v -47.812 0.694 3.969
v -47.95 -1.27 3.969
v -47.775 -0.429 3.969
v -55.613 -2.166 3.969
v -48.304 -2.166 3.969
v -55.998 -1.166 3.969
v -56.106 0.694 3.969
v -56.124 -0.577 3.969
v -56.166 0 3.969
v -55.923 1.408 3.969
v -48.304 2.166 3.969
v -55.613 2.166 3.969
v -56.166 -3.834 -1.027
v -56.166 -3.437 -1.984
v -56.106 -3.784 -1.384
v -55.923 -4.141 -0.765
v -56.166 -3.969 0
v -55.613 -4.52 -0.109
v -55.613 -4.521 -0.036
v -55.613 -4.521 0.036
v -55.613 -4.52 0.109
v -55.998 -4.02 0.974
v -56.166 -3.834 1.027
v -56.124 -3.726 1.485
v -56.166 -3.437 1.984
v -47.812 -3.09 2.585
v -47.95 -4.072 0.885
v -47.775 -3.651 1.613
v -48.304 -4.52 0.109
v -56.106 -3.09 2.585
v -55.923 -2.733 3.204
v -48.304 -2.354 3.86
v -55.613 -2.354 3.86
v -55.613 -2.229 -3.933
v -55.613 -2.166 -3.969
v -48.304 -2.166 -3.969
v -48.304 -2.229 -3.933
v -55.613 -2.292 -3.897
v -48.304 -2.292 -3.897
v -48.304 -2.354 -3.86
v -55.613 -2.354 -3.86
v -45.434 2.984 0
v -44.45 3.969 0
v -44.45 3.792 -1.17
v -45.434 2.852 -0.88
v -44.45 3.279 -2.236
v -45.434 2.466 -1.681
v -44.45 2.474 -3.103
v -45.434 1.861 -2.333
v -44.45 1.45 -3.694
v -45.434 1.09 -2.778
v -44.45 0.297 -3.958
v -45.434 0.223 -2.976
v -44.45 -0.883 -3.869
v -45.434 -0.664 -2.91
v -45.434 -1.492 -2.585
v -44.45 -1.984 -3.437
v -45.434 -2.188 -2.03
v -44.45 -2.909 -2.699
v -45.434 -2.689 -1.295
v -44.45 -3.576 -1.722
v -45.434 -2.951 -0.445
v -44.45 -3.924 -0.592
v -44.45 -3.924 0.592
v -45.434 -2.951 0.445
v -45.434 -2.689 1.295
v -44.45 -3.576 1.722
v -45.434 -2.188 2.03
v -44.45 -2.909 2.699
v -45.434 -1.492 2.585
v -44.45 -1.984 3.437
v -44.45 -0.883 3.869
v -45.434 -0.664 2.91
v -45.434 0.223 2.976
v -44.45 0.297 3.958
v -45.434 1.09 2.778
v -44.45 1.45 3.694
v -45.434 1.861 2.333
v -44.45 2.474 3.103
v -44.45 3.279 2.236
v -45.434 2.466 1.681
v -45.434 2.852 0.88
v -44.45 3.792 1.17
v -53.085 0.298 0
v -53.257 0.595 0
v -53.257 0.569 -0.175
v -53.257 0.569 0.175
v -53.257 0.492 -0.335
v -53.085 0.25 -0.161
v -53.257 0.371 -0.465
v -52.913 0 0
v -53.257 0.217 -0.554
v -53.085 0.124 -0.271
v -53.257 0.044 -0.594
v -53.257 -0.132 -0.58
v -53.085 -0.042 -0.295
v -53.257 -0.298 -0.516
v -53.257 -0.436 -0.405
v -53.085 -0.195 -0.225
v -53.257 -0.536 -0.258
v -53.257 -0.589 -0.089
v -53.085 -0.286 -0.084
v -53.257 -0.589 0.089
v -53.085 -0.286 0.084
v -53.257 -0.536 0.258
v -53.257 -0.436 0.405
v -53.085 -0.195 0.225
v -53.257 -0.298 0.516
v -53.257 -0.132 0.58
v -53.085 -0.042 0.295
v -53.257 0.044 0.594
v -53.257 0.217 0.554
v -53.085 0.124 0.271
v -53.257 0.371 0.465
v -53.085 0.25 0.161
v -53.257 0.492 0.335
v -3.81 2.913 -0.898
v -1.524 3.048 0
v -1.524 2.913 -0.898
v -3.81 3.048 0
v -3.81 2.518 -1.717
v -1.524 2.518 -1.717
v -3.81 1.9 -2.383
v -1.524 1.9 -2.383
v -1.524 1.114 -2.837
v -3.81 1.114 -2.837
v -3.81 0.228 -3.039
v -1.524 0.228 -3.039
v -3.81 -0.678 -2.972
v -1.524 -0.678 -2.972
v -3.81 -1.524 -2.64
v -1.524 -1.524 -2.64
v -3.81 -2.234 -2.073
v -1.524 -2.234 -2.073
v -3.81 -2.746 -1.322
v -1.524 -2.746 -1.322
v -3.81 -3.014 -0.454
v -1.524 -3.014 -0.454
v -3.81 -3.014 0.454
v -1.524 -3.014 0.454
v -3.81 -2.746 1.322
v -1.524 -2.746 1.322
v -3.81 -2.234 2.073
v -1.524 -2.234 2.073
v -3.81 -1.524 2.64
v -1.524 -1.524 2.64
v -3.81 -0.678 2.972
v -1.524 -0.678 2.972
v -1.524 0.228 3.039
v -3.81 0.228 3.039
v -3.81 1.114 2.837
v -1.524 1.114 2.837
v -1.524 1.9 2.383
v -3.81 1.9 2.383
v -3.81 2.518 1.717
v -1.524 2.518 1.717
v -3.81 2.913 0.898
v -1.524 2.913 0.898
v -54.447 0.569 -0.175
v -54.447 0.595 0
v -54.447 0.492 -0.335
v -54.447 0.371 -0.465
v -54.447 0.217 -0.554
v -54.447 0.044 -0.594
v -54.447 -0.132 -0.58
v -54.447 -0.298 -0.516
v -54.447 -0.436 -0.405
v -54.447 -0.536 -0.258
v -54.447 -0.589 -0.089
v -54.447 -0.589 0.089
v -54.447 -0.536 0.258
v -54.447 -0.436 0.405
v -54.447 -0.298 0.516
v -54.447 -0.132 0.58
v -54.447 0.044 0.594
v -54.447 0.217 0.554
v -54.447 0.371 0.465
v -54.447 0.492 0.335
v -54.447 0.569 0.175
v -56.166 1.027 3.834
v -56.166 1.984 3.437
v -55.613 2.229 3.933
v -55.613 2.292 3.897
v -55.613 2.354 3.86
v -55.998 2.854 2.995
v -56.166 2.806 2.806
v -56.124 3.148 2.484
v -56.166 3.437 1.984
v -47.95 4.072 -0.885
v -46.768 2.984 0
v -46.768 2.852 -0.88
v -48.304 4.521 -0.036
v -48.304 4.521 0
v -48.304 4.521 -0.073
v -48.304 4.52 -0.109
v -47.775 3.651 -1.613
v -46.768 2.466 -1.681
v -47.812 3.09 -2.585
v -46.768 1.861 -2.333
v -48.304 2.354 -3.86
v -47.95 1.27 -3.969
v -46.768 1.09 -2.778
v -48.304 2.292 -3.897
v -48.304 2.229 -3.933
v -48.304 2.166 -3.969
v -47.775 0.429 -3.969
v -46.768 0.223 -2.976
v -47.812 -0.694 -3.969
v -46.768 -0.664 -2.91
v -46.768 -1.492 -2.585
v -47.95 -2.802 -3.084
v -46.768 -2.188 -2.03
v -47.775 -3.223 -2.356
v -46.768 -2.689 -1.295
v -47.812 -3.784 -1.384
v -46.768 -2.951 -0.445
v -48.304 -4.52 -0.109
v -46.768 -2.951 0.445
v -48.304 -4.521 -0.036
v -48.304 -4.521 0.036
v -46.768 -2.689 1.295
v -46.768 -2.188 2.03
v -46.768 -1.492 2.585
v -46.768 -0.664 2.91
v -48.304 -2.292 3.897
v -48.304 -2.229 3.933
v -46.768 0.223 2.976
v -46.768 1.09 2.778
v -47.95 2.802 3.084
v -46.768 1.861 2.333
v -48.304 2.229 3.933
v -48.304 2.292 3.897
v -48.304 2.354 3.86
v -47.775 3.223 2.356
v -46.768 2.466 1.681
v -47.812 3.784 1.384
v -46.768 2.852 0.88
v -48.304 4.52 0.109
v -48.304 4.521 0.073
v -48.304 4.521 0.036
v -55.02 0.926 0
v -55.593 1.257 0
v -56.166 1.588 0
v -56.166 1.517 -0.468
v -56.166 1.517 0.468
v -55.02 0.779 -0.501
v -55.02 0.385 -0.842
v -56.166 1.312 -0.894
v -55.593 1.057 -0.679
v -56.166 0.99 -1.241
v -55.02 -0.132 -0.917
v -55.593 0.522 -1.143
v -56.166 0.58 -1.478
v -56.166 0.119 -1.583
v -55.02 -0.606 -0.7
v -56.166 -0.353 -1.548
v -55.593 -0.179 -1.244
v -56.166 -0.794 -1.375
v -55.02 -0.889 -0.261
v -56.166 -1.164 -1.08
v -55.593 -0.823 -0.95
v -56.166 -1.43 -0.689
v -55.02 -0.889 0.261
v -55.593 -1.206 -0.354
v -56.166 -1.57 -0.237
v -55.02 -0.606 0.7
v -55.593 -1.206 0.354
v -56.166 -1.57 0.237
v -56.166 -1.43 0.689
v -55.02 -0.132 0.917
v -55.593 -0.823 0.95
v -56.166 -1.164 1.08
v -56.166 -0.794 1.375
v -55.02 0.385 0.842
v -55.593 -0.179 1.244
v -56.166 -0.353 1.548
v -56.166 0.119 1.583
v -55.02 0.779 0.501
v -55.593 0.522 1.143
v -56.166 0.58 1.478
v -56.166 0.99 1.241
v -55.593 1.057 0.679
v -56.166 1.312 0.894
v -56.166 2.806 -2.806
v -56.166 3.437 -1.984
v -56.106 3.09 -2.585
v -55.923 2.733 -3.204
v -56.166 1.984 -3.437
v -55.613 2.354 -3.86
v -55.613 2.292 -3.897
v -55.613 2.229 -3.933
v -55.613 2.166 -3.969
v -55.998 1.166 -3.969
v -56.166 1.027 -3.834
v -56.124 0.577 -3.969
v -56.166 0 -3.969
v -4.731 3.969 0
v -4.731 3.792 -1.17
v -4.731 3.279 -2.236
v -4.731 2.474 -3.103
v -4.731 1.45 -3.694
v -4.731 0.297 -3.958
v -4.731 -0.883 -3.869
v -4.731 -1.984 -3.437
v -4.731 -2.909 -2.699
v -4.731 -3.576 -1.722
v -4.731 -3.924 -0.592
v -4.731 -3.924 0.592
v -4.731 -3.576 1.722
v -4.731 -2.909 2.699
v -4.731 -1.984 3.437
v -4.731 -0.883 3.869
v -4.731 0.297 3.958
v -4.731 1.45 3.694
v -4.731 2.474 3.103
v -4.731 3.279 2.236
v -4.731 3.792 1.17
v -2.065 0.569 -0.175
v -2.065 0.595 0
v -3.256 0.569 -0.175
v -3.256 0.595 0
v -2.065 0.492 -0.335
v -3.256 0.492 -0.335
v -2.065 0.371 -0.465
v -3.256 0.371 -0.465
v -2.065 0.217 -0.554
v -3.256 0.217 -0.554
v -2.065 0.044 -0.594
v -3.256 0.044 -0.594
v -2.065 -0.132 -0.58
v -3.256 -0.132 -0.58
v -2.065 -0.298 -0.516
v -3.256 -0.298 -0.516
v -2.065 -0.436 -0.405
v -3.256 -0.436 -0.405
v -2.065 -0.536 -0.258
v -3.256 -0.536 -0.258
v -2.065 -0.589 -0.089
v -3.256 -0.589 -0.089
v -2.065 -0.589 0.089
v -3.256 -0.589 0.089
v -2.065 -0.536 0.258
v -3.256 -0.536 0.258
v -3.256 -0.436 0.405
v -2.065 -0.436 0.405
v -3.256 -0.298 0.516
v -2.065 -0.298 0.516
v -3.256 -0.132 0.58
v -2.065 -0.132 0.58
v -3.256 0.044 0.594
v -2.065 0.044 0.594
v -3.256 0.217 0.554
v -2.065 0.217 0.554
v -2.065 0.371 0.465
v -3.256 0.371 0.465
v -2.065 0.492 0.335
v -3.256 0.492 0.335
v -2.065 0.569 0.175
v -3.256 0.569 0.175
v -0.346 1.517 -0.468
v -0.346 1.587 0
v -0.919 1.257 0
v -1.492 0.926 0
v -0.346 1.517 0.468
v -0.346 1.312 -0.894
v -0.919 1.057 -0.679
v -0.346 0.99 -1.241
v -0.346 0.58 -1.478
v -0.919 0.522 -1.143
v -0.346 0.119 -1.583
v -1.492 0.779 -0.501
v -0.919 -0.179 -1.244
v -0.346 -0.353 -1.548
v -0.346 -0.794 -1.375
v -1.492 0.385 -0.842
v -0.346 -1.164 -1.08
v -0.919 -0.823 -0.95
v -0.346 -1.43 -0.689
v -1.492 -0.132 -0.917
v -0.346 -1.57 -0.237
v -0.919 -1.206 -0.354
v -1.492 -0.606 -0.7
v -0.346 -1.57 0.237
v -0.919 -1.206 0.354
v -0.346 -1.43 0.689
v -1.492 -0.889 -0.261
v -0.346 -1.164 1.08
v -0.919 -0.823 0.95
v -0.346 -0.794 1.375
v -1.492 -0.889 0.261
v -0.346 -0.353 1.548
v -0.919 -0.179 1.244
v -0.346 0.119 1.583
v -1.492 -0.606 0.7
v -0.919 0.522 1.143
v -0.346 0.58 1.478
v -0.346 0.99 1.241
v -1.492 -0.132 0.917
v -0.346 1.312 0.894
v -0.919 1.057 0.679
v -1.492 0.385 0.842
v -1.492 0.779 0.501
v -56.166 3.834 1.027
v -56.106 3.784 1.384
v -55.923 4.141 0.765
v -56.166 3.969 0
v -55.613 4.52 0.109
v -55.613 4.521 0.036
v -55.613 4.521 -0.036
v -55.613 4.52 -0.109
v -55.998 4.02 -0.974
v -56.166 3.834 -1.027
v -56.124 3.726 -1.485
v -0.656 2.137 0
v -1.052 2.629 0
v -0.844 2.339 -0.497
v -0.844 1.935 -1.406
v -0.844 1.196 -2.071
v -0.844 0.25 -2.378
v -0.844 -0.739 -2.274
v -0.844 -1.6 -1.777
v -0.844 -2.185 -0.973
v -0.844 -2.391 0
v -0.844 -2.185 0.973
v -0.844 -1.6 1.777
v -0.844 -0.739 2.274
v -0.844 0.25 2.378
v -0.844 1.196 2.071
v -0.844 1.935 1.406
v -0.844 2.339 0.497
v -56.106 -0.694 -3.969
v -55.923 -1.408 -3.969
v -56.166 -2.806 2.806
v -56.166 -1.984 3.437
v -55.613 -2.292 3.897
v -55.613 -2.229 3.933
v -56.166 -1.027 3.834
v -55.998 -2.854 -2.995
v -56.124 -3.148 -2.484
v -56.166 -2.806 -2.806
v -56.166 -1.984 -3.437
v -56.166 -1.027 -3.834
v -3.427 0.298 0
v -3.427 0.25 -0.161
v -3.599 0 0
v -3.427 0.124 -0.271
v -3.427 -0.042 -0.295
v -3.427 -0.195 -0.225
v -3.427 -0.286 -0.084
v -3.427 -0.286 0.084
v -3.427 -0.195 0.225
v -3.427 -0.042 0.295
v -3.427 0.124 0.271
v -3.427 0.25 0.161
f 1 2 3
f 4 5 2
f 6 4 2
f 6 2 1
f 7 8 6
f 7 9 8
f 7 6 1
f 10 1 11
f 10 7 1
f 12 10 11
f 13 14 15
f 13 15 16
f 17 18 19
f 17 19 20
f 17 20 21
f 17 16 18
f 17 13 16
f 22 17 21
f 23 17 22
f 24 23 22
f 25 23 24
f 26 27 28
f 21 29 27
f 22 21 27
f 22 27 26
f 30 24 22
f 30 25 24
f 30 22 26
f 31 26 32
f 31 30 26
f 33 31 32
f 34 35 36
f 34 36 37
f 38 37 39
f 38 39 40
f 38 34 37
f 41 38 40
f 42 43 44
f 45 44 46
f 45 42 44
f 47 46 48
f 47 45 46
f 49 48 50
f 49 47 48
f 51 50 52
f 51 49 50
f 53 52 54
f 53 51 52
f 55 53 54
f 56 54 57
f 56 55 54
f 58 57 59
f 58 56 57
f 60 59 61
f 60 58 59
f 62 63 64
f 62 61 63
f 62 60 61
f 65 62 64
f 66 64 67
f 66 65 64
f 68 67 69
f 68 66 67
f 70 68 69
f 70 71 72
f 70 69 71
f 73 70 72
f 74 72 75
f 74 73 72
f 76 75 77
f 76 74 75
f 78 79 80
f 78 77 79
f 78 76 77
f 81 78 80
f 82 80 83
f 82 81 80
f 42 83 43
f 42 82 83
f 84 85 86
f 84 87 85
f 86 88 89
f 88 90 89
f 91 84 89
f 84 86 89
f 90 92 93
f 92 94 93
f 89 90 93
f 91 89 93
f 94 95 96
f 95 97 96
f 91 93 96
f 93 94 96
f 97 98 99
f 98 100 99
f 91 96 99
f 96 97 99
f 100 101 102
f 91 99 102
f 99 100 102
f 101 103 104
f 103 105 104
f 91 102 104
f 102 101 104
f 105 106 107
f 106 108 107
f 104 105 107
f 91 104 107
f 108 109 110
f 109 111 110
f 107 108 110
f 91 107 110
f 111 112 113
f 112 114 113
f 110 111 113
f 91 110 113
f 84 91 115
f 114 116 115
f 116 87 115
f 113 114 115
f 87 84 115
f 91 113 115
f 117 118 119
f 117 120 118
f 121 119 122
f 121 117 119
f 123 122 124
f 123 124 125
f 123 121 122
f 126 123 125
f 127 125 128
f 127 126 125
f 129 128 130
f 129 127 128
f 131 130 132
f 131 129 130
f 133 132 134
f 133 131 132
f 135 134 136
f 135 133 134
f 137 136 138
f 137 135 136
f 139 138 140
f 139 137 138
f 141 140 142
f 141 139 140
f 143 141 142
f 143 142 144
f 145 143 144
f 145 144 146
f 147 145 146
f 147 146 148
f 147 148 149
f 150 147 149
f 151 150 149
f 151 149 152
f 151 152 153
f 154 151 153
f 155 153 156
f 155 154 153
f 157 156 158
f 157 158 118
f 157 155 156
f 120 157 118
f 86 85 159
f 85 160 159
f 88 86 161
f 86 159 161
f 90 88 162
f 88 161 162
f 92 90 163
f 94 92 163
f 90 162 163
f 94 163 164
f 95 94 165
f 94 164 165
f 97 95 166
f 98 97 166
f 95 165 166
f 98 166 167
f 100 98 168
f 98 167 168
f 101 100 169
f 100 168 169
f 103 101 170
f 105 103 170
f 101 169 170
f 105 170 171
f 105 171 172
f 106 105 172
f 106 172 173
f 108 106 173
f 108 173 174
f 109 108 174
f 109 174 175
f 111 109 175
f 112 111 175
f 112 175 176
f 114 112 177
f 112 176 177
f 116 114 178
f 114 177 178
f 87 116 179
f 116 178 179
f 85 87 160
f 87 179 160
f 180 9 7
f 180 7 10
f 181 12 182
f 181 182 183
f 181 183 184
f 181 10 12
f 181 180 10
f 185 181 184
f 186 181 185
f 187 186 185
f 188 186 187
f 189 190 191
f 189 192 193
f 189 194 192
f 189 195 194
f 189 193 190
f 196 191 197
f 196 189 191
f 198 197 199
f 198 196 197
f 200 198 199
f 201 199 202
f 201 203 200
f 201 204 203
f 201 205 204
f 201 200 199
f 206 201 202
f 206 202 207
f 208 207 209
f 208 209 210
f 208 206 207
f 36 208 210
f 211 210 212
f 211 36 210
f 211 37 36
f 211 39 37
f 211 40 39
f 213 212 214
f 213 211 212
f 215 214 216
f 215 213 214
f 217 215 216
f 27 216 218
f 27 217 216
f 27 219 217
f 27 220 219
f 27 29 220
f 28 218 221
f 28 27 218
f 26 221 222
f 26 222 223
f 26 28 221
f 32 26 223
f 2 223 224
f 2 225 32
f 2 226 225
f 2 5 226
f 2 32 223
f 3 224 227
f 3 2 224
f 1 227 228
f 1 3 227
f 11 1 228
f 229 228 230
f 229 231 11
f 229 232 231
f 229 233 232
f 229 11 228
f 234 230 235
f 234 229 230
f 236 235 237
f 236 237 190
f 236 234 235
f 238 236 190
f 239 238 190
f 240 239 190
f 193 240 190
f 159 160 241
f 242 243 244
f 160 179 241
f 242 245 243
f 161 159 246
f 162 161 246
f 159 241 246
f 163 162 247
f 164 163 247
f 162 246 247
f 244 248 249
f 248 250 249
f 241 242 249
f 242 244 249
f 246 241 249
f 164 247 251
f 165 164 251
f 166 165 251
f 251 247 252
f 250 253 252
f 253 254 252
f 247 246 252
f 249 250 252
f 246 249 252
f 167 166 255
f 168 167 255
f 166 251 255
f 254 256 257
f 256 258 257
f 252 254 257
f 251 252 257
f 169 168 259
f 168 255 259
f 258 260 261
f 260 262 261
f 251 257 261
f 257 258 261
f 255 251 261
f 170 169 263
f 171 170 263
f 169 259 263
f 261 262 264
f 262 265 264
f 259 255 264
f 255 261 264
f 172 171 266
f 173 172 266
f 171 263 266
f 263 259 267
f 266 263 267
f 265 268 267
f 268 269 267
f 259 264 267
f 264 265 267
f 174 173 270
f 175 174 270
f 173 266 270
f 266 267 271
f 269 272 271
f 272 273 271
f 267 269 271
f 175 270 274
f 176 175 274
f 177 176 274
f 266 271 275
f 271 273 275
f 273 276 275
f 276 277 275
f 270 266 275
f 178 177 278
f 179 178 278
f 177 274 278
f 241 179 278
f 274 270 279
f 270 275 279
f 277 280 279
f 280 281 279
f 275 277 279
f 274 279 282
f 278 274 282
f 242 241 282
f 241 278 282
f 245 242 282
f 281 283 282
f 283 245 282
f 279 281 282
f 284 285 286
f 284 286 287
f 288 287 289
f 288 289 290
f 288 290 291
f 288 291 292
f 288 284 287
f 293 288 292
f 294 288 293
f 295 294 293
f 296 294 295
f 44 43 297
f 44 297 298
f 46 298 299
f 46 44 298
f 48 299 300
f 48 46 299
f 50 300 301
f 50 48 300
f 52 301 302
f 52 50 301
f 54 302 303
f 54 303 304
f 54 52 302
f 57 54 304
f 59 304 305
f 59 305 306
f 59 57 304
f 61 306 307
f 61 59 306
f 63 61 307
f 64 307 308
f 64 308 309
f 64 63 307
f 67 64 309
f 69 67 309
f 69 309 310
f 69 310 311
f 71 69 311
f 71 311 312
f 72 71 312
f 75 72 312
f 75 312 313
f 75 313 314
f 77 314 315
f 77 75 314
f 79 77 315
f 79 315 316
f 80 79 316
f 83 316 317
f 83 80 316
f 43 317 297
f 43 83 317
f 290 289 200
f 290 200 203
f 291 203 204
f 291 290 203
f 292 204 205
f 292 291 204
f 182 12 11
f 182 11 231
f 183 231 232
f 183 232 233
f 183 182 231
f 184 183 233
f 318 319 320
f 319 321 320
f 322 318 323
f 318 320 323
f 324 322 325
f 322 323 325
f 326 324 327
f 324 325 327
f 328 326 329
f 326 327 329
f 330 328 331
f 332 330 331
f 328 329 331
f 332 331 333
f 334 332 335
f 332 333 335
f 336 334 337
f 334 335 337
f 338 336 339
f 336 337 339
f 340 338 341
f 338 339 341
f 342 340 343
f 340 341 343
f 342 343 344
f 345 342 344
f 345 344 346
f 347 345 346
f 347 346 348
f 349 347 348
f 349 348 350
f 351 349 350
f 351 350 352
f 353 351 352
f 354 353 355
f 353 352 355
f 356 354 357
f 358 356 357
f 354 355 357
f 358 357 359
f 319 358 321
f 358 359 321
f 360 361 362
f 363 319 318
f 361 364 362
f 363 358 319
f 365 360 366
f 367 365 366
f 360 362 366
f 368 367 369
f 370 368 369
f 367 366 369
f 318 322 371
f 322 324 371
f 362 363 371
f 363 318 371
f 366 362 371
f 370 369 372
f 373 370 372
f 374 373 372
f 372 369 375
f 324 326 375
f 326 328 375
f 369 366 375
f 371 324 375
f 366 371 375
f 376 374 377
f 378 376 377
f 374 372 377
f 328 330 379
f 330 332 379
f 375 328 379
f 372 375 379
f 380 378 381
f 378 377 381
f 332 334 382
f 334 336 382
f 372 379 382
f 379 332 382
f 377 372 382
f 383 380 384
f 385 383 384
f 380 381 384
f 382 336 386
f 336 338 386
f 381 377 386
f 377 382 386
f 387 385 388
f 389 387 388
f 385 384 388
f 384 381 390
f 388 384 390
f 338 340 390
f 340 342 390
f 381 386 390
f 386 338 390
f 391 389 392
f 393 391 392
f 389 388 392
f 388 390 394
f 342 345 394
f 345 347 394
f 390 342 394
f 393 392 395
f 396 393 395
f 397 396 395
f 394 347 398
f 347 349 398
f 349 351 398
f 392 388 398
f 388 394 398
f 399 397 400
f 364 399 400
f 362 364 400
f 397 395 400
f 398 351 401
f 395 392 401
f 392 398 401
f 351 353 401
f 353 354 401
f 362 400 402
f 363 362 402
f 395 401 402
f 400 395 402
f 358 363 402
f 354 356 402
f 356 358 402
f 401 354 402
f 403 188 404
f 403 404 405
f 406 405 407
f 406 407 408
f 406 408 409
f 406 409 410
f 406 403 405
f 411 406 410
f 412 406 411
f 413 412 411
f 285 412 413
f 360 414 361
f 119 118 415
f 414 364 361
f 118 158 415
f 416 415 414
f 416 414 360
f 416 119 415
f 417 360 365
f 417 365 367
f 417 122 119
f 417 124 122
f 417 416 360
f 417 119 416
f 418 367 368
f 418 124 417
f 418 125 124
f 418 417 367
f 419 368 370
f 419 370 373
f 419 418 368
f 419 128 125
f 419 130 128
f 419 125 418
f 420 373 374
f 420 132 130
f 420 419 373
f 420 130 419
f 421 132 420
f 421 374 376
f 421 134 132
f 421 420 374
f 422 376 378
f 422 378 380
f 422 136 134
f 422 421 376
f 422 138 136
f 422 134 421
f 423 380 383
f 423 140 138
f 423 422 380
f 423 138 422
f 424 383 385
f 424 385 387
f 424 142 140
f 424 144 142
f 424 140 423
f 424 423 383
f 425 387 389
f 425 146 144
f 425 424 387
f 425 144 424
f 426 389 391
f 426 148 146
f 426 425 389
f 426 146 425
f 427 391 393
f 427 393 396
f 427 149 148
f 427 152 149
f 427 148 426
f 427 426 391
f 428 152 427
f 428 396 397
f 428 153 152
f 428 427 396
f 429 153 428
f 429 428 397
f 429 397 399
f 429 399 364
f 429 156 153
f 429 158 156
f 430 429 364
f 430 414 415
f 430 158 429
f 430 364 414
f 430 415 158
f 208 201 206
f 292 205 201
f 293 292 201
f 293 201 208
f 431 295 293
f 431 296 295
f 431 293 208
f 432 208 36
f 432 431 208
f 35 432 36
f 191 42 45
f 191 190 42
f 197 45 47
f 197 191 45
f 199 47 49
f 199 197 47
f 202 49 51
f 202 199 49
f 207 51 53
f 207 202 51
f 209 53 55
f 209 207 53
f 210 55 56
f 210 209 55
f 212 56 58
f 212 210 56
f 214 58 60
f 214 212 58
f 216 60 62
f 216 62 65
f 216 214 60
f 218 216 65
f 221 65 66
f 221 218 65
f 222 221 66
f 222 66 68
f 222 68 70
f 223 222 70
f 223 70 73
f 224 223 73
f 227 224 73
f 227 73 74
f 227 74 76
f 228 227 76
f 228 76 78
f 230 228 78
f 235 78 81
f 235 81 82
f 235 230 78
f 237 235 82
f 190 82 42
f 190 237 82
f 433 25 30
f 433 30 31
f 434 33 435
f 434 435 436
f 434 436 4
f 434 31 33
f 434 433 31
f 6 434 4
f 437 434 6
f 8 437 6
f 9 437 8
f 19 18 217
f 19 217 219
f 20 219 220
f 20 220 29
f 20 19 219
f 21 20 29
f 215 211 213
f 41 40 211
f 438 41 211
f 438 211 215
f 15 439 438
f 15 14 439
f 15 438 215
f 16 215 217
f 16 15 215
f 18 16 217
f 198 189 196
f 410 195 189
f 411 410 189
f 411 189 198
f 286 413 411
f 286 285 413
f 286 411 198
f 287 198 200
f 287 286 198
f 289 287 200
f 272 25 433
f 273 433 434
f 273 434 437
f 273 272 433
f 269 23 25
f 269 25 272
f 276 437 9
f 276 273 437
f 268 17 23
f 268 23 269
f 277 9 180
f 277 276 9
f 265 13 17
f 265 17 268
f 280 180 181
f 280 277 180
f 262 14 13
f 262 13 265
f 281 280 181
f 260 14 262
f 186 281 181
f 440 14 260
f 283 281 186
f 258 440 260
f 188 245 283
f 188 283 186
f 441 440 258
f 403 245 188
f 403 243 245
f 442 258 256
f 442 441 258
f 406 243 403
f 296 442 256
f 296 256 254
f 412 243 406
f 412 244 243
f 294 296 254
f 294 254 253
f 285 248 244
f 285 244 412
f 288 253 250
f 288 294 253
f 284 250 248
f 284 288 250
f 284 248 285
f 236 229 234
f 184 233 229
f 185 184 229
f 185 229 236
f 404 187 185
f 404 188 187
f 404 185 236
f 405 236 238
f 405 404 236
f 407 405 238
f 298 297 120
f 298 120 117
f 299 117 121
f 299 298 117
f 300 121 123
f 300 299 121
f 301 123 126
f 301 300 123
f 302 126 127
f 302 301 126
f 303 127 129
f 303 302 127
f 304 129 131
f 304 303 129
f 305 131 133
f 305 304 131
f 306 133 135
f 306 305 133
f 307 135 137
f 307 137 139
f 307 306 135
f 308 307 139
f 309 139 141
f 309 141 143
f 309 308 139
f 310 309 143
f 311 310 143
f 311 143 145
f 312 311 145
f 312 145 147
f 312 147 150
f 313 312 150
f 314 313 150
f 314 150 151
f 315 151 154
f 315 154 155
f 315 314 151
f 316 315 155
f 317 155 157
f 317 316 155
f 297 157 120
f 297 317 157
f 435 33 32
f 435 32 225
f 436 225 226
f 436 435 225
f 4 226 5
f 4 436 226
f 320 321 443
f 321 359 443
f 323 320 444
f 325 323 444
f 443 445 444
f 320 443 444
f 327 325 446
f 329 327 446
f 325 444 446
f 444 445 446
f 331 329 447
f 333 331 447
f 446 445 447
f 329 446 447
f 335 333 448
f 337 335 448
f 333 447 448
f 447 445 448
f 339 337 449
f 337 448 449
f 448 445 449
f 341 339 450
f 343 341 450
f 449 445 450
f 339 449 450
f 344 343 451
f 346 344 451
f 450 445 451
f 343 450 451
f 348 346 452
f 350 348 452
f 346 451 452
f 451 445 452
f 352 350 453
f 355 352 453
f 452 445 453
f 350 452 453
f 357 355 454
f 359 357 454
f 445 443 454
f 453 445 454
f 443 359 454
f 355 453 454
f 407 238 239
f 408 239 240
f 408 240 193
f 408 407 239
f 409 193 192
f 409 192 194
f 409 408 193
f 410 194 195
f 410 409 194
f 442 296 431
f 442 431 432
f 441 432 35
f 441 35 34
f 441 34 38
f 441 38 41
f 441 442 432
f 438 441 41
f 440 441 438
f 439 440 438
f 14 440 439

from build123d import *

# Parameters (mm, degrees)
SKETCH2_OUTSIDE_W  = 23.076
SKETCH2_OUTSIDE_H  = 23.077
CUT_EXTRUDE1_DEPTH = 57.16575
SKETCH3_OUTSIDE_W  = 21.43
SKETCH3_OUTSIDE_H  = 22.658
SKETCH3_OUTSIDE_R  = 4.5212
CUT_EXTRUDE2_DEPTH = 57.16575


with BuildPart() as part:
    # Sketch1 → Revolve1 (revolve)
    with BuildSketch(Plane.XY):
        with BuildLine():
            Line((-4.73075, 3.96875), (-44.45, 3.96875))
            Line((-44.45, 3.96875), (-45.43425, 2.9845))
            Line((-45.43425, 2.9845), (-46.76775, 2.9845))
            Line((-46.76775, 2.9845), (-48.54575, 4.7625))
            Line((-48.54575, 4.7625), (-55.372, 4.7625))
            Line((-55.372, 4.7625), (-56.16575, 3.96875))
            Line((-56.16575, 3.96875), (-56.16575, 0))
            Line((-56.16575, 0), (0, 0))
            ThreePointArc((0, 0), (-0.402232402, 1.703883799), (-1.524, 3.048))
            Line((-1.524, 3.048), (-3.81, 3.048))
            Line((-3.81, 3.048), (-4.73075, 3.96875))
        make_face()
    revolve(axis=Axis((1.163601772, 0, 0), (-1, 0, 0)))

    # Sketch2 outside → Cut-Extrude1 (cut, through all)
    with BuildSketch(Plane.ZY.offset(56.16575)):
        with Locations((0, -0.0005)):
            Rectangle(SKETCH2_OUTSIDE_W, SKETCH2_OUTSIDE_H)
        Polygon((0, -4.582717762), (3.96875, -2.291358881), (3.96875, 2.291358881), (0, 4.582717762), (-3.96875, 2.291358881), (-3.96875, -2.291358881), align=None, mode=Mode.SUBTRACT)
    extrude(amount=-CUT_EXTRUDE1_DEPTH, mode=Mode.SUBTRACT)

    # Sketch3 outside → Cut-Extrude2 (cut, through all)
    with BuildSketch(Plane.ZY.offset(56.16575)):
        Rectangle(SKETCH3_OUTSIDE_W, SKETCH3_OUTSIDE_H)
        Circle(SKETCH3_OUTSIDE_R, mode=Mode.SUBTRACT)
    extrude(amount=-CUT_EXTRUDE2_DEPTH, mode=Mode.SUBTRACT)

    # Sketch4 → Cut-Revolve1 (revolve, cut)
    with BuildSketch(Plane.XY):
        with BuildLine():
            Line((-0.346483904, 1.5875), (-2.065003064, 0.5953125))
            Line((-2.065003064, 0.5953125), (-3.255628064, 0.5953125))
            Line((-3.255628064, 0.5953125), (-3.599331896, 0))
            Line((-3.599331896, 0), (0, 0))
            ThreePointArc((0, 0), (-0.087628691, 0.812435743), (-0.346483904, 1.5875))
        make_face()
        Polygon((-56.16575, 0), (-52.912902007, 0), (-53.256605839, 0.5953125), (-54.447230839, 0.5953125), (-56.16575, 1.5875), align=None)
    revolve(axis=Axis((1.163601772, 0, 0), (-1, 0, 0)), mode=Mode.SUBTRACT)


solid = part.part
